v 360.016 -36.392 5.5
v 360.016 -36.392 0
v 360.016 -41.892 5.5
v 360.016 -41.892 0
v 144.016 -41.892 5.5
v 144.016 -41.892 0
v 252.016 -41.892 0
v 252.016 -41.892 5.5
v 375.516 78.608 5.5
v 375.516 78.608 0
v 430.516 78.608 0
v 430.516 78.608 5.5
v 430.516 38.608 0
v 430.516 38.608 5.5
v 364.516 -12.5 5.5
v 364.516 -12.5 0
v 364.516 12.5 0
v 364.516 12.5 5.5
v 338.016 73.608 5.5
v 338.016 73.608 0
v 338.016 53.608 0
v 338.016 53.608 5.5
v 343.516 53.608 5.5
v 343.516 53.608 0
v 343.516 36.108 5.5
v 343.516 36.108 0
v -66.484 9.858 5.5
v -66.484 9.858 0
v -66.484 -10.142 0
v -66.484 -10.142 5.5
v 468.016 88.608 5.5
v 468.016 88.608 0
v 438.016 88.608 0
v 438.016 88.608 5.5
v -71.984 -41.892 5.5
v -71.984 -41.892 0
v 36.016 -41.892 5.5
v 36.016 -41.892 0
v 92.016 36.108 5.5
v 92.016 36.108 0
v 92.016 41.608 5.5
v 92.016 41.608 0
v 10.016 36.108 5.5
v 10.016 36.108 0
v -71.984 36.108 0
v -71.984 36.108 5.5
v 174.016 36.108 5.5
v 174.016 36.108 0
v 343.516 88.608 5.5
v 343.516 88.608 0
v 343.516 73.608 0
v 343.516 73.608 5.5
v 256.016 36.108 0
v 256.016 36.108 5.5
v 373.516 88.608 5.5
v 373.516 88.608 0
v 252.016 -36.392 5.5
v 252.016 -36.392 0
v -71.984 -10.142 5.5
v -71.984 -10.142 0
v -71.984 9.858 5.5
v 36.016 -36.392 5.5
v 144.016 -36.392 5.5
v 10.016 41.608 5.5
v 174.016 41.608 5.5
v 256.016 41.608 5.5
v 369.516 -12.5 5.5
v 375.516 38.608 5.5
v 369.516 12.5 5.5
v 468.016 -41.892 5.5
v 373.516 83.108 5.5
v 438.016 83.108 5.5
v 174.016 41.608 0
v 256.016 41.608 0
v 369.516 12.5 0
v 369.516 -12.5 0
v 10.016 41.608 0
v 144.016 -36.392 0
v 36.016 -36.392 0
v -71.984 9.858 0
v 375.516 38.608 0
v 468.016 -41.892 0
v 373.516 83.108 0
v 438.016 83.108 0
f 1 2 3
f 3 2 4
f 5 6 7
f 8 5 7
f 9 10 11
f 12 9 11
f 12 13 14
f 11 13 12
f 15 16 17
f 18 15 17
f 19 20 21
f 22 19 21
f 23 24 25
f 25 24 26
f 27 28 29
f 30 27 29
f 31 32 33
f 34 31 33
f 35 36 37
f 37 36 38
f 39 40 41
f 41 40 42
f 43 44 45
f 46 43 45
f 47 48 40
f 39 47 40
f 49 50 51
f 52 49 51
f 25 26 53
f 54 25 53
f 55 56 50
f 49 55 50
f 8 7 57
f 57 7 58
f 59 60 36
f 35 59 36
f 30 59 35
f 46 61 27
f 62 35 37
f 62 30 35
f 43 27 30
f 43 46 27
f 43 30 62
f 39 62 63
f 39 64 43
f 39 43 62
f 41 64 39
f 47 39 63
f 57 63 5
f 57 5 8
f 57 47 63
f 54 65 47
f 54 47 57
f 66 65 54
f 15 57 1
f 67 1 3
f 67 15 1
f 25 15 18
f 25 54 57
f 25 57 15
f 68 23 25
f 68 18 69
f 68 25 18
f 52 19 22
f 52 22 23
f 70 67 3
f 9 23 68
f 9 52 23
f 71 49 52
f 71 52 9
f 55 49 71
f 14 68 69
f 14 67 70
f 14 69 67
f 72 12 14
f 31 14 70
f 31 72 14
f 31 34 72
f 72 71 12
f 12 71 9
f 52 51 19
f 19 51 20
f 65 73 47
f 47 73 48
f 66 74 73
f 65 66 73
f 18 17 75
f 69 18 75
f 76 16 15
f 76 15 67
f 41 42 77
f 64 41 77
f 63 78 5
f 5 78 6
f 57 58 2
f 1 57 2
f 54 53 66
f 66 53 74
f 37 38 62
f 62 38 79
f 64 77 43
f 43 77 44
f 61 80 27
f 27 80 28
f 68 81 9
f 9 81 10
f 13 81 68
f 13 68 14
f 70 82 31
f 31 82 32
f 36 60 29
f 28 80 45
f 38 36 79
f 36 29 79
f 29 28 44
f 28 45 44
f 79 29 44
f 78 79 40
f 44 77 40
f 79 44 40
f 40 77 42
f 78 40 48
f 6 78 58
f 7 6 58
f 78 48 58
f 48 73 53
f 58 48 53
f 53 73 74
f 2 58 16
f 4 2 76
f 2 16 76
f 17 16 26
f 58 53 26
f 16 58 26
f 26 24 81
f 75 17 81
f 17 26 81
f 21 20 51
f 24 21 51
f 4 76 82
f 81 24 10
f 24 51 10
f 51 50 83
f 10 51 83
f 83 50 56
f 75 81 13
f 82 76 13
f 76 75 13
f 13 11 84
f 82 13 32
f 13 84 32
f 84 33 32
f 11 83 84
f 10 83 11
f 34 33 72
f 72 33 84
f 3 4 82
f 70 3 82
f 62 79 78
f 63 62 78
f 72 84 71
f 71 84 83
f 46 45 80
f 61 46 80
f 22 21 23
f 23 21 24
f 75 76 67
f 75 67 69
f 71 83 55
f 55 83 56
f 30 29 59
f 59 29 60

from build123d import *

# Parameters (mm, degrees)
CROQUIS1_W              = 55
CROQUIS1_H              = 40
CROQUIS1_W_2            = 5
CROQUIS1_H_2            = 25
SALIENTE_EXTRUIR1_DEPTH = 5.5


with BuildPart() as part:
    # Croquis1 → Saliente-Extruir1 (new body)
    with BuildSketch(Plane.XY):
        Polygon((-71.983561291, 36.108229285), (-71.983561291, 9.858229285), (-66.483561291, 9.858229285), (-66.483561291, -10.141770715), (-71.983561291, -10.141770715), (-71.983561291, -41.891770715), (36.016438709, -41.891770715), (36.016438709, -36.391770715), (144.016438709, -36.391770715), (144.016438709, -41.891770715), (252.016438709, -41.891770715), (252.016438709, -36.391770715), (360.016438709, -36.391770715), (360.016438709, -41.891770715), (468.016438709, -41.891770715), (468.016438709, 88.608229285), (438.016438709, 88.608229285), (438.016438709, 83.108229285), (373.516438709, 83.108229285), (373.516438709, 88.608229285), (343.516438709, 88.608229285), (343.516438709, 73.608229285), (338.016438709, 73.608229285), (338.016438709, 53.608229285), (343.516438709, 53.608229285), (343.516438709, 36.108229285), (338.016438709, 36.108229285), (256.016438709, 36.108229285), (256.016438709, 41.608229285), (174.016438709, 41.608229285), (174.016438709, 36.108229285), (92.016438709, 36.108229285), (92.016438709, 41.608229285), (10.016438709, 41.608229285), (10.016438709, 36.108229285), align=None)
        with Locations((403.016438709, 58.608229285)):
            Rectangle(CROQUIS1_W, CROQUIS1_H, mode=Mode.SUBTRACT)
        with Locations((367.016438709, 0)):
            Rectangle(CROQUIS1_W_2, CROQUIS1_H_2, mode=Mode.SUBTRACT)
    extrude(amount=SALIENTE_EXTRUIR1_DEPTH)


solid = part.part
